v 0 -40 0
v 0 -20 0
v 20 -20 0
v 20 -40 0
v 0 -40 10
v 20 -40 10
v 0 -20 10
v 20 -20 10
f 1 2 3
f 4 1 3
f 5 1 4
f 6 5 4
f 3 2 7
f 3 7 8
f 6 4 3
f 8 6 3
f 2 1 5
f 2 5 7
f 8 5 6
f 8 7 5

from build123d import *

# Parameters (mm, degrees)
BOX011_W     = 10
BOX011_H     = 10
BOX011_DEPTH = 10
BOX009_W     = 10
BOX009_H     = 10
BOX009_DEPTH = 10
BOX010_W     = 10
BOX010_H     = 10
BOX010_DEPTH = 10
BOX008_W     = 10
BOX008_H     = 10
BOX008_DEPTH = 10


with BuildPart() as cubo011:
    # Box011 → Box011 (new body)
    with BuildSketch(Plane(origin=(10, 10, 0), x_dir=(1, 0, 0), z_dir=(0, 0, 1))):
        with Locations((5, 5)):
            Rectangle(BOX011_W, BOX011_H)
    extrude(amount=BOX011_DEPTH)


with BuildPart() as cubo009:
    # Box009 → Box009 (new body)
    with BuildSketch(Plane(origin=(0, 10, 0), x_dir=(1, 0, 0), z_dir=(0, 0, 1))):
        with Locations((5, 5)):
            Rectangle(BOX009_W, BOX009_H)
    extrude(amount=BOX009_DEPTH)


with BuildPart() as cubo010:
    # Box010 → Box010 (new body)
    with BuildSketch(Plane(origin=(10, 0, 0), x_dir=(1, 0, 0), z_dir=(0, 0, 1))):
        with Locations((5, 5)):
            Rectangle(BOX010_W, BOX010_H)
    extrude(amount=BOX010_DEPTH)


with BuildPart() as fusion002002:
    # Box008 → Box008 (new body)
    with BuildSketch(Plane.XY):
        with Locations((5, 5)):
            Rectangle(BOX008_W, BOX008_H)
    extrude(amount=BOX008_DEPTH)

    # Fusion002002: union Cubo011, Cubo009, Cubo010
    add(cubo011.part)
    add(cubo009.part)
    add(cubo010.part)


with BuildPart() as fusion002002_1:
    # Fusion002002 placement: moved
    add(fusion002002.part.moved(Location((0, -40, 0))))


solid = fusion002002_1.part
